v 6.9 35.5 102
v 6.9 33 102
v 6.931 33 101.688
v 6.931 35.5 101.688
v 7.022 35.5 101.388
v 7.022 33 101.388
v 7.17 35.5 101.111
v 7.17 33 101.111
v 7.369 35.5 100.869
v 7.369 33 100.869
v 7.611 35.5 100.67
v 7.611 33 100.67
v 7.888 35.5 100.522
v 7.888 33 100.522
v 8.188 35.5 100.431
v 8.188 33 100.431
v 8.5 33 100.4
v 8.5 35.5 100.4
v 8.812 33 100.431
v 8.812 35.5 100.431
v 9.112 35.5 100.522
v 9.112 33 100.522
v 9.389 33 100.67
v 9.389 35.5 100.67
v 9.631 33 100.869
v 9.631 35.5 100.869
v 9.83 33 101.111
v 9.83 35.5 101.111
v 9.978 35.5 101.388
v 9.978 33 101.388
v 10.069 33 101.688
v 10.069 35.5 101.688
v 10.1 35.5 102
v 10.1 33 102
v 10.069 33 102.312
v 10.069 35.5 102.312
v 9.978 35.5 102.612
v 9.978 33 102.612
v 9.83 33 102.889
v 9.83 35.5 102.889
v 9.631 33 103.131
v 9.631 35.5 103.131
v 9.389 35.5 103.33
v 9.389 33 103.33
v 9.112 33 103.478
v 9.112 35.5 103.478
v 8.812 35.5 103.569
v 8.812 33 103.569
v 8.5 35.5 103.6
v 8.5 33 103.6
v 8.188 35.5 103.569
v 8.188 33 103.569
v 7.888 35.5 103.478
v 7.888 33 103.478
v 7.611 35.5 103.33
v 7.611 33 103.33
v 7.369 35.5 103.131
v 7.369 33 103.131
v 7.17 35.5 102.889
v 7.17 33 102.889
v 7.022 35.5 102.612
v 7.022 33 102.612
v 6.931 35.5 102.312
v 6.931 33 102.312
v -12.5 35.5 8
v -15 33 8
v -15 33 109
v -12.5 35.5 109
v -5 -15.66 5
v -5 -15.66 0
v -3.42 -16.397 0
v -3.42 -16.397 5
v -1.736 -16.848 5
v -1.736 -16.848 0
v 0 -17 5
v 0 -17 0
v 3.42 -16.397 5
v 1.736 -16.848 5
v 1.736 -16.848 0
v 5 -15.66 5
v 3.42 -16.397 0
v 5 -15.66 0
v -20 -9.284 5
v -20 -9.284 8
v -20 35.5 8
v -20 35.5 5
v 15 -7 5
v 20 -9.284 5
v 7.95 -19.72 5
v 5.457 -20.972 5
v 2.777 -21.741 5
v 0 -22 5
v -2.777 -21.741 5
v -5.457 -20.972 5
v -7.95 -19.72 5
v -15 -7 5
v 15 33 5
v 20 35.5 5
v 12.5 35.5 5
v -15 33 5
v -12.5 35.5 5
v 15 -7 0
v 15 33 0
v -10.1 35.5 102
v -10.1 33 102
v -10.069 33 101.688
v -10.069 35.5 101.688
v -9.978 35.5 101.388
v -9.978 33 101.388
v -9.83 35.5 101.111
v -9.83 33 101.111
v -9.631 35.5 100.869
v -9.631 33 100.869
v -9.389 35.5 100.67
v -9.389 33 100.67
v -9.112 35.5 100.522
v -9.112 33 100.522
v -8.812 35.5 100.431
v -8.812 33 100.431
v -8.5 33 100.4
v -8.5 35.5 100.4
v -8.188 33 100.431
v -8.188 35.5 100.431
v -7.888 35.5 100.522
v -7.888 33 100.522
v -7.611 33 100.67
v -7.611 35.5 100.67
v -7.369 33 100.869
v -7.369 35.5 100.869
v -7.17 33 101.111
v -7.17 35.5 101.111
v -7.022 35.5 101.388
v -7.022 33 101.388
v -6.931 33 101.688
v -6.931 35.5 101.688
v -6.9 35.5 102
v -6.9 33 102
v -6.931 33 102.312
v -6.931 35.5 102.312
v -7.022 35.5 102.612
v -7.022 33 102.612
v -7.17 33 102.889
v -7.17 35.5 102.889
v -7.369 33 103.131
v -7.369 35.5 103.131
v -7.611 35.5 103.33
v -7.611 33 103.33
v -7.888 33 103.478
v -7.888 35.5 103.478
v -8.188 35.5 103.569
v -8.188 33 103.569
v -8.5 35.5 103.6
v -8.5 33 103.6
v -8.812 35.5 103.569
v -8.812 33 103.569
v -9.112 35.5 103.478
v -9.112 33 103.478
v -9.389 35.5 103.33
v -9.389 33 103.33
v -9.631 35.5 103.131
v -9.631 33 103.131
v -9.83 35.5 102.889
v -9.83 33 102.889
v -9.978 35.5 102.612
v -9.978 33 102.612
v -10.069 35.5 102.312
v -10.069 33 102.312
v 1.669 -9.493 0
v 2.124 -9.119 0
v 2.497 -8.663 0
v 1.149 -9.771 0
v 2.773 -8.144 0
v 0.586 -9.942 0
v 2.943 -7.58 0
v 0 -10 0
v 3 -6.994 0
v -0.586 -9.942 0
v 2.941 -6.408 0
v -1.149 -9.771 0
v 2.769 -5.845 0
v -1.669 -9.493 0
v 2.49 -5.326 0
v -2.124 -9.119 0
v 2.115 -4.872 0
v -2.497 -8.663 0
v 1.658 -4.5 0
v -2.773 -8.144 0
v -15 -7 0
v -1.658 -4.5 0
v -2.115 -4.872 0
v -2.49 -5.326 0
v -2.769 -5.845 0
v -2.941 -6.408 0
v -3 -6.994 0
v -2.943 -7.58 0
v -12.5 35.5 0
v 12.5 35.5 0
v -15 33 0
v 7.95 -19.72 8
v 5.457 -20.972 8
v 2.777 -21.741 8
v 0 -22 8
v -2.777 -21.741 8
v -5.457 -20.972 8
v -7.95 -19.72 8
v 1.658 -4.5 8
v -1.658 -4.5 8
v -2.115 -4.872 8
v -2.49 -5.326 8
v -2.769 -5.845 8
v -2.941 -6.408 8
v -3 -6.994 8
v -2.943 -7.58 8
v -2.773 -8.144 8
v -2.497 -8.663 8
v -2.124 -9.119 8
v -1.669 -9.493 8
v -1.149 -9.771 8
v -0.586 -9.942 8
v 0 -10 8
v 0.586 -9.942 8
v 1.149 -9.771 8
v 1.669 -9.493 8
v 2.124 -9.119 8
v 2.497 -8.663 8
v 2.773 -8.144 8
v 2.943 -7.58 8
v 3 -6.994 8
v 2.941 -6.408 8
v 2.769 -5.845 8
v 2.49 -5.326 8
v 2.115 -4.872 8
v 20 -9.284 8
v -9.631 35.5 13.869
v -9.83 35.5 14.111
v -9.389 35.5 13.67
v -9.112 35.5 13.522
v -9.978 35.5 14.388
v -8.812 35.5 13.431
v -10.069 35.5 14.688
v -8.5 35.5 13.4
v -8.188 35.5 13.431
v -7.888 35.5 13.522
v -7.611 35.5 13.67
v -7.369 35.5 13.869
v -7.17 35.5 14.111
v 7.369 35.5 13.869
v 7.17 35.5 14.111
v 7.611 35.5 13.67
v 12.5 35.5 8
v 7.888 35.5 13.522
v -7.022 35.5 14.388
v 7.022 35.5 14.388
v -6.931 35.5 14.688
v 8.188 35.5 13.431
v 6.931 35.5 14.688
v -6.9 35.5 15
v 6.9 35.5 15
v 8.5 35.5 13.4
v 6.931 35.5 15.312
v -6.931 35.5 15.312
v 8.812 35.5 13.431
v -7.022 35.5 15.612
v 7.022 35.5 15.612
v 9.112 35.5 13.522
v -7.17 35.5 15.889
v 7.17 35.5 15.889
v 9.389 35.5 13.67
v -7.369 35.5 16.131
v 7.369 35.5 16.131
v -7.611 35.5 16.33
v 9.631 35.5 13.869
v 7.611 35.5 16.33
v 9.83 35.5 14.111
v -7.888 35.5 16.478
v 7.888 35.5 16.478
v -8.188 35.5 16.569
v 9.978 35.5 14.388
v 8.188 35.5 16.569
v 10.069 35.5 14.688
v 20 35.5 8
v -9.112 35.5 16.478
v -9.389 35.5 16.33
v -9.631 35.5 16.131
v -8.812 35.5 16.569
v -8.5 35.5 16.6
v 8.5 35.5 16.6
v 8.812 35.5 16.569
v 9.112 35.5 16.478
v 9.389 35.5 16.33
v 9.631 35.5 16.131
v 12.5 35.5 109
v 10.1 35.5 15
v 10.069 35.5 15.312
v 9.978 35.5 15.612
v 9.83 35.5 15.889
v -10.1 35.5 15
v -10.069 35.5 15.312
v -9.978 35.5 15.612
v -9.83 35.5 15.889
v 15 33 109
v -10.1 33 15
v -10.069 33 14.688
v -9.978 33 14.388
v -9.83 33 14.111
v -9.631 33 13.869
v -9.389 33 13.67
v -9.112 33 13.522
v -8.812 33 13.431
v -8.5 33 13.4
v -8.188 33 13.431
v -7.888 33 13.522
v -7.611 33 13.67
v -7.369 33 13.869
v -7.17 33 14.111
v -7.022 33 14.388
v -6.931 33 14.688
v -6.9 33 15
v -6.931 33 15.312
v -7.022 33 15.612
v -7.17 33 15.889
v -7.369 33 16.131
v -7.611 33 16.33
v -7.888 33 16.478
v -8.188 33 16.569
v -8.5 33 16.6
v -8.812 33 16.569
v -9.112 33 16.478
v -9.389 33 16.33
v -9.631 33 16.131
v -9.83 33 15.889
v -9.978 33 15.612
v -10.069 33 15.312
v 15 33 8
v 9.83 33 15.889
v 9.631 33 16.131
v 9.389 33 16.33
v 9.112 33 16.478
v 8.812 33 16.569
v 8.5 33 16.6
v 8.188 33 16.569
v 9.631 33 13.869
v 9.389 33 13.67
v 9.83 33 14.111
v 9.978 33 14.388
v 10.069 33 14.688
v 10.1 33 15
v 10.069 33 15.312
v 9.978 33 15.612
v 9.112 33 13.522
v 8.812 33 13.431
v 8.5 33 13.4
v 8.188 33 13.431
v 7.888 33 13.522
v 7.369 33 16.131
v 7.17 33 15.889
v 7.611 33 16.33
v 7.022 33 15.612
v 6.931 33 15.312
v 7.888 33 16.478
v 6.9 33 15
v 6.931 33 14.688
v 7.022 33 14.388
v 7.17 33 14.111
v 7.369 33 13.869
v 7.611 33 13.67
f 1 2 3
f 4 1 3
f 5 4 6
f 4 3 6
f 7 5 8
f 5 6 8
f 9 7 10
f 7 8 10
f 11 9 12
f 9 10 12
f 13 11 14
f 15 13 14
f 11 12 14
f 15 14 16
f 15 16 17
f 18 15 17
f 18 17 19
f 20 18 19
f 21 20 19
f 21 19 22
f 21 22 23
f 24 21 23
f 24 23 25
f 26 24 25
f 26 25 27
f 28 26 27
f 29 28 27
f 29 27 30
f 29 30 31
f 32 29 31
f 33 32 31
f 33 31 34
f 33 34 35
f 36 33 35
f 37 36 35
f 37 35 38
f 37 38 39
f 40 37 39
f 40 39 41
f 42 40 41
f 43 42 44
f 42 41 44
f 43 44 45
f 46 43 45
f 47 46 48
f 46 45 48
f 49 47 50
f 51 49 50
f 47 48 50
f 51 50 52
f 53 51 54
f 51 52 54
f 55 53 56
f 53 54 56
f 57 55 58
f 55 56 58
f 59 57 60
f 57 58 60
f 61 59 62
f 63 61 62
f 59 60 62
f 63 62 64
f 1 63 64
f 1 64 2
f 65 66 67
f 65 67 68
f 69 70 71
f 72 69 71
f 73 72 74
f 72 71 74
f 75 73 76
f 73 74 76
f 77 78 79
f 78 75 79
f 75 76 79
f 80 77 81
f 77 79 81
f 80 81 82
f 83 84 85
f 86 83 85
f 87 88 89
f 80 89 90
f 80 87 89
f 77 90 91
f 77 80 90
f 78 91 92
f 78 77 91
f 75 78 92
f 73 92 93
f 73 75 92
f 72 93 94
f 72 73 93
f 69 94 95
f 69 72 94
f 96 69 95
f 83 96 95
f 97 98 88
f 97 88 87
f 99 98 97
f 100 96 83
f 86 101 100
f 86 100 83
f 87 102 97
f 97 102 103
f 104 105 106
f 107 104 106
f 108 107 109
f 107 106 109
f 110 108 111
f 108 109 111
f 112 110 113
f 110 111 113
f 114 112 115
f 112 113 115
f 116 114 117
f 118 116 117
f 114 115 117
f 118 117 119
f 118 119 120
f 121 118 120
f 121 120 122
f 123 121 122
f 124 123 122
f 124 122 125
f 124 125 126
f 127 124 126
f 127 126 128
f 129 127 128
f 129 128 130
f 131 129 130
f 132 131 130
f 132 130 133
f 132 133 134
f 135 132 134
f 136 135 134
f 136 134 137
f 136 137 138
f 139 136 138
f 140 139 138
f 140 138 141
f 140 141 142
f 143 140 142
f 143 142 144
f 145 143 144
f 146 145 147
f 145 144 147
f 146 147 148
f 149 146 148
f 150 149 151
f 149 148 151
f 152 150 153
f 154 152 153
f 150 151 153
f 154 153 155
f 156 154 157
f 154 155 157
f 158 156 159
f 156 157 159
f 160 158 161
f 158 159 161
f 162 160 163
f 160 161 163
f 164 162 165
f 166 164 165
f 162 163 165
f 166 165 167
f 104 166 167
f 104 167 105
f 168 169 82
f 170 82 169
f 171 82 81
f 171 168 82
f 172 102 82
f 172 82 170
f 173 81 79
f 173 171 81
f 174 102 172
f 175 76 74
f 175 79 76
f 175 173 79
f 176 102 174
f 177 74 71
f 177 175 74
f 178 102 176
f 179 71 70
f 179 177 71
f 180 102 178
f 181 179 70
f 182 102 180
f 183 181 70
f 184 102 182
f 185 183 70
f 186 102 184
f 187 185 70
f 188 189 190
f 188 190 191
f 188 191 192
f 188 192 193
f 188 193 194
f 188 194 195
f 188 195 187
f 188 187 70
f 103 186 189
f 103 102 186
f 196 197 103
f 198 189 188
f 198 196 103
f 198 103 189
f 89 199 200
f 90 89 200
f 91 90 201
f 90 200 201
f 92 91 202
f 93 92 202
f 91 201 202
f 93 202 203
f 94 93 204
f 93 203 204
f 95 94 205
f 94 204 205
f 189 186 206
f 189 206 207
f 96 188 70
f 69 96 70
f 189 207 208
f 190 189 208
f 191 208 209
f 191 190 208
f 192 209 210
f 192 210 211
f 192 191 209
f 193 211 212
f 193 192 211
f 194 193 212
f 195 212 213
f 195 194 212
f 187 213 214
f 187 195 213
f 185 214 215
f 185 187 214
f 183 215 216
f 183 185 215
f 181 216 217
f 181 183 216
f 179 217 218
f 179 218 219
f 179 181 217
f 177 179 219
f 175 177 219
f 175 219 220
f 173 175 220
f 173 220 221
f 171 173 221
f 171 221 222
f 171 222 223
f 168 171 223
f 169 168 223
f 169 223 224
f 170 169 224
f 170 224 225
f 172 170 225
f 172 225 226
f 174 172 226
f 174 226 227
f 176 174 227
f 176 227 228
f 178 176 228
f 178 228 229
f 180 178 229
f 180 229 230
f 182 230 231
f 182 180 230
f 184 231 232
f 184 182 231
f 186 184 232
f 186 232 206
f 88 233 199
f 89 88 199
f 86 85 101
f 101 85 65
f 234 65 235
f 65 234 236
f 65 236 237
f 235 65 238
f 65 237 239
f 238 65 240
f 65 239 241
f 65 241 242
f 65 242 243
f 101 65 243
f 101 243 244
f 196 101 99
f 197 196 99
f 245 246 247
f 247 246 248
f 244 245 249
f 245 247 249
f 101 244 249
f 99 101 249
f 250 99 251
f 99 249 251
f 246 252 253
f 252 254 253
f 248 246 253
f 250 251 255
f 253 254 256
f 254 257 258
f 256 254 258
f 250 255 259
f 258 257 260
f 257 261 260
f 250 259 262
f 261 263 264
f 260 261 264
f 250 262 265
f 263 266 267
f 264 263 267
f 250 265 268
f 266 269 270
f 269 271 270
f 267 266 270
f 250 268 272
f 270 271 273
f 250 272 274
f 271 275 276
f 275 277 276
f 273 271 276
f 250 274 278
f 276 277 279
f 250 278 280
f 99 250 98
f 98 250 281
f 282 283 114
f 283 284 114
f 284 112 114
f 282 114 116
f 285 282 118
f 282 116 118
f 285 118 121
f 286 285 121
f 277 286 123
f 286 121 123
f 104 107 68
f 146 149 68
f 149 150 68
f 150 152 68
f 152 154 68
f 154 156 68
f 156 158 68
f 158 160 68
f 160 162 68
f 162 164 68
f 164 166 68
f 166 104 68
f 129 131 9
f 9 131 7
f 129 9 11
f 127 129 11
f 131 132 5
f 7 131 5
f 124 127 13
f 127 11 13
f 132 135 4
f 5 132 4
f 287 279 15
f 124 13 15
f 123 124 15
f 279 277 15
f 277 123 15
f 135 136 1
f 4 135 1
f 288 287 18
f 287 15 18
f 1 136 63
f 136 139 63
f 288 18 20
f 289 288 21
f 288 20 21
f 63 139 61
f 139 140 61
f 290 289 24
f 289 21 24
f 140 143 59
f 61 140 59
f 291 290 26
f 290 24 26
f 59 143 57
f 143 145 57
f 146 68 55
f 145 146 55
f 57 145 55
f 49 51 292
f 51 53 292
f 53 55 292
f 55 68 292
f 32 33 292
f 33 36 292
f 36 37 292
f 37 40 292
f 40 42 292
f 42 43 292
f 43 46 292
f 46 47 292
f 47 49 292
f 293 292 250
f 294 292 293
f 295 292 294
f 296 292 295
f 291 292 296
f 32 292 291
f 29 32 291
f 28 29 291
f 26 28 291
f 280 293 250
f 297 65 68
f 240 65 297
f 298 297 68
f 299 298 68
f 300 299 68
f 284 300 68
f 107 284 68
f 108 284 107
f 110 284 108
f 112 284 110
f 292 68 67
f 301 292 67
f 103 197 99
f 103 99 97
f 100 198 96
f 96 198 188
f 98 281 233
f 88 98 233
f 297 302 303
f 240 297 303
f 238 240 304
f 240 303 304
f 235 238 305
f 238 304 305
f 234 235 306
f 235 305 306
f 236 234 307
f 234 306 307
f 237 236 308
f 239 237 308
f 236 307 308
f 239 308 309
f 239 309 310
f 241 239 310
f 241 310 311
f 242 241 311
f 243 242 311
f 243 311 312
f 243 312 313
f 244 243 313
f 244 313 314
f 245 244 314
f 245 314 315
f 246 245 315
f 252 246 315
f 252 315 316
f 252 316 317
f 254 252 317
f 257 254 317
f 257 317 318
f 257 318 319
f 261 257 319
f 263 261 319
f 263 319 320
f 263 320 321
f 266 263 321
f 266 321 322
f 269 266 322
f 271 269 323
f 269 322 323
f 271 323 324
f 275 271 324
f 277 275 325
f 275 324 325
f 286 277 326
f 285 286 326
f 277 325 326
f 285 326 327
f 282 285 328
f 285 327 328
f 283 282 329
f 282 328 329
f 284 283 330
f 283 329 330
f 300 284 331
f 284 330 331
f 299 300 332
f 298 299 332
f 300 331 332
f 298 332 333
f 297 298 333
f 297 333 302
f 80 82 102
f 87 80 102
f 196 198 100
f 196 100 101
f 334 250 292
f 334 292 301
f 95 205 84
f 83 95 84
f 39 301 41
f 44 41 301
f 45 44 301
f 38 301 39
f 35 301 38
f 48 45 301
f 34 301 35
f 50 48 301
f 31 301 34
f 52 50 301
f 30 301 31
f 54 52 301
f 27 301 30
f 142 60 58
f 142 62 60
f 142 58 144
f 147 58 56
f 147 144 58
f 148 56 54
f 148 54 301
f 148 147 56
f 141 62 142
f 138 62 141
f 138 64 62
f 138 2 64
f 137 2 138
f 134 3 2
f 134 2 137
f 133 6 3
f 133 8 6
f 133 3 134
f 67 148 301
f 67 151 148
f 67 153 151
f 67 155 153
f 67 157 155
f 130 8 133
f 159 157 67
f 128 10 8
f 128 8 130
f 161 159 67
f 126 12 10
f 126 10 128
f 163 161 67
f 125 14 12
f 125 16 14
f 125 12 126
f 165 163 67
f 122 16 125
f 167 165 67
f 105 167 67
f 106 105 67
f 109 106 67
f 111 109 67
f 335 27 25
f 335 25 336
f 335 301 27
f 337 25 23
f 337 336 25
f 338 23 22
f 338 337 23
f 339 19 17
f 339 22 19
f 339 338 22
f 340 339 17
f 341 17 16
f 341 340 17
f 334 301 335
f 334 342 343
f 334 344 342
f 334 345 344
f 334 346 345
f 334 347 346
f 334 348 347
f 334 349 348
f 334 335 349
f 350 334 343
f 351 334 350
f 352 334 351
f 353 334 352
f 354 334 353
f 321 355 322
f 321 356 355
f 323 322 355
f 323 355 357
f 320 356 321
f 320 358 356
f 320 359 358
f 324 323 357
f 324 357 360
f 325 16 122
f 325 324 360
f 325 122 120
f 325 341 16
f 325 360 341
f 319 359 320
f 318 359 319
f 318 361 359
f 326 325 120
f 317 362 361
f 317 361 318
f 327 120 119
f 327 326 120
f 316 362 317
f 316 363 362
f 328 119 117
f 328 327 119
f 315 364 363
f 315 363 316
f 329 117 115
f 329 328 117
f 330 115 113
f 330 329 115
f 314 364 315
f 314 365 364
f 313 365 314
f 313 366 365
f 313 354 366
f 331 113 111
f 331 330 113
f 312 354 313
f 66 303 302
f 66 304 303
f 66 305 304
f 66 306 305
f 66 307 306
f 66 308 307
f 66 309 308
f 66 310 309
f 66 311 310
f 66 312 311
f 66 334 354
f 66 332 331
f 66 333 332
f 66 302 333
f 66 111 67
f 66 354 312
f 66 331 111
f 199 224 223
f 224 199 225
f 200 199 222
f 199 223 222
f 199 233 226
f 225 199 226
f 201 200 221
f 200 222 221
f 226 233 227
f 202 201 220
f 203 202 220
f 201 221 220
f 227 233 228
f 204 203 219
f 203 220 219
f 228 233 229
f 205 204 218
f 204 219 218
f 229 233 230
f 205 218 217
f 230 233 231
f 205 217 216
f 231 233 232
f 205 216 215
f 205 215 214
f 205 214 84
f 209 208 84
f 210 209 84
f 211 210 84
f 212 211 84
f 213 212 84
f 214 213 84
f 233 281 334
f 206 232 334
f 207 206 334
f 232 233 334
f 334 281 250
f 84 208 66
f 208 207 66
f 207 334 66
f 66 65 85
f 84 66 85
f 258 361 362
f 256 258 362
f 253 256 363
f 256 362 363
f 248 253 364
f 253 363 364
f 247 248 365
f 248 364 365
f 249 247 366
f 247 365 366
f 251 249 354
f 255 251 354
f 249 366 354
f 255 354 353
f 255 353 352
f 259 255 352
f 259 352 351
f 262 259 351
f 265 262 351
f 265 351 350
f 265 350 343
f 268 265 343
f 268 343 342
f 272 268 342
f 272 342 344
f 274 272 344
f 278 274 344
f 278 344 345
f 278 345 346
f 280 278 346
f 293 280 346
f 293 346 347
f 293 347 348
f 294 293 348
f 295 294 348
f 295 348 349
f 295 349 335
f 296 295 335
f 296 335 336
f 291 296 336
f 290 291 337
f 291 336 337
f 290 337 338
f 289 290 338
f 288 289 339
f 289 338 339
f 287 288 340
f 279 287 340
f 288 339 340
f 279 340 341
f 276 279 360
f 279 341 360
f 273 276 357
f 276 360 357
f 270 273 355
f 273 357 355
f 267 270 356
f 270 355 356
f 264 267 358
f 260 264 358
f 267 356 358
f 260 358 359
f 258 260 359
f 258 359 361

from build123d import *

# Parameters (mm, degrees)
BOSS_EXTRUDE1_DEPTH  = 8
BOSS_EXTRUDE3_DEPTH  = 109
M3_CLEARANCE_SLOT1_D = 3.2
BOSS_EXTRUDE4_DEPTH  = 3


with BuildPart() as part:
    # Sketch1 → Boss-Extrude1 (new body)
    with BuildSketch(Plane.XY):
        with BuildLine():
            Line((15, 33), (-15, 33))
            Line((-15, 33), (-15, -7))
            Line((-15, -7), (-5, -15.660254038))
            ThreePointArc((-5, -15.660254038), (0, -17), (5, -15.660254038))
            Line((5, -15.660254038), (15, -7))
            Line((15, -7), (15, 33))
        make_face()
        with BuildLine():
            Line((1.658312395, -4.5), (-1.658312395, -4.5))
            ThreePointArc((-1.658312395, -4.5), (0, -10), (1.658312395, -4.5))
        make_face(mode=Mode.SUBTRACT)
    extrude(amount=BOSS_EXTRUDE1_DEPTH)

    # Sketch1<5> → Boss-Extrude3 (add)
    with BuildSketch(Plane.XY):
        Polygon((-12.5, 35.5), (12.5, 35.5), (15, 33), (-15, 33), align=None)
    extrude(amount=BOSS_EXTRUDE3_DEPTH)

    # M3 Clearance Slot1 (through all)
    with Locations(Plane(origin=(0, 35.5, 0), x_dir=(1, 0, 0), z_dir=(0, 1, 0))):
        with Locations((-8.5, -15), (8.5, -15), (-8.5, -102), (8.5, -102)):
            Hole(M3_CLEARANCE_SLOT1_D / 2)

    # Sketch6 → Boss-Extrude4 (add)
    with BuildSketch(Plane.XY.offset(8)):
        with BuildLine():
            Line((-20, 35.5), (20, 35.5))
            Line((20, 35.5), (20, 33))
            Line((20, 33), (20, -9.284251259))
            Line((20, -9.284251259), (7.949555075, -19.720242691))
            ThreePointArc((7.949555075, -19.720242691), (0, -22), (-7.949555075, -19.720242691))
            Line((-7.949555075, -19.720242691), (-20, -9.284251259))
            Line((-20, -9.284251259), (-20, 33))
            Line((-20, 33), (-20, 35.5))
        make_face()
        with BuildLine():
            Line((1.658312395, -4.5), (-1.658312395, -4.5))
            ThreePointArc((-1.658312395, -4.5), (0, -10), (1.658312395, -4.5))
        make_face(mode=Mode.SUBTRACT)
    extrude(amount=-BOSS_EXTRUDE4_DEPTH)


solid = part.part
